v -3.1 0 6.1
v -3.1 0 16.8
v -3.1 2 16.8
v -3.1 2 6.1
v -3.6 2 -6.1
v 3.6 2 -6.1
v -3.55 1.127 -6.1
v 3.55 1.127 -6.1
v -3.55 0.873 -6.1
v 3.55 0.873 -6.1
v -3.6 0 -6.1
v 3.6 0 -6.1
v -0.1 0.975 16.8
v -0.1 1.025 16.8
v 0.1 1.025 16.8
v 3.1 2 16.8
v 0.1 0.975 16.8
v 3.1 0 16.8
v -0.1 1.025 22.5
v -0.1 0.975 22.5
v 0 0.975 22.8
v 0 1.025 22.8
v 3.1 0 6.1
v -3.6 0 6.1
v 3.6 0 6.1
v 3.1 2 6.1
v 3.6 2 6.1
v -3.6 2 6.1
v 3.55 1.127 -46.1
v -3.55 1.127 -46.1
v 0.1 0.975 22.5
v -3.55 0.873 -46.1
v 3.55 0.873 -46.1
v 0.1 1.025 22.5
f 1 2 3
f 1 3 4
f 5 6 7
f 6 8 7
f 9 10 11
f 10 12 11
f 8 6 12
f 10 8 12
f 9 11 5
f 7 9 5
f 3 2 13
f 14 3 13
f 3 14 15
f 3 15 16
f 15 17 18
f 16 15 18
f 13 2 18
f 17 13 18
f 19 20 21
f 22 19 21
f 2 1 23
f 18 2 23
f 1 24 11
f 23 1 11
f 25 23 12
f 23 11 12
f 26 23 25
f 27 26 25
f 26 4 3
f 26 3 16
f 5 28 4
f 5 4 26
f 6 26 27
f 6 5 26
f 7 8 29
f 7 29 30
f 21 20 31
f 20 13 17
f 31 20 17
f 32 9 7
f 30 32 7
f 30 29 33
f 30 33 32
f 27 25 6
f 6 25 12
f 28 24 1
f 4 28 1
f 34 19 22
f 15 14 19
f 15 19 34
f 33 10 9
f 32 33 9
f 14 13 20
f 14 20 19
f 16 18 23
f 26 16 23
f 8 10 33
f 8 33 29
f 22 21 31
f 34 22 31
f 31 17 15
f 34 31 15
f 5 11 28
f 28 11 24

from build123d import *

# Parameters (mm, degrees)
SKETCH1_W           = 6.2
SKETCH1_H           = 10.7
BOSS_EXTRUDE1_DEPTH = 2
SKETCH2_W           = 7.1
SKETCH2_H           = 0.25368462
BOSS_EXTRUDE2_DEPTH = 40
SKETCH3_W           = 0.2
SKETCH3_H           = 0.05
BOSS_EXTRUDE3_DEPTH = 6
CUT_EXTRUDE1_DEPTH  = 0.05


with BuildPart() as part:
    # Sketch1 → Boss-Extrude1 (new body)
    with BuildSketch(Plane(origin=(0, 0, 0), x_dir=(1, 0, 0), z_dir=(0, 1, 0))):
        Polygon((-3.6, -6.1), (-3.1, -6.1), (3.1, -6.1), (3.6, -6.1), (3.6, 6.1), (-3.6, 6.1), align=None)
        with Locations((0, -11.45)):
            Rectangle(SKETCH1_W, SKETCH1_H)
    extrude(amount=BOSS_EXTRUDE1_DEPTH)

    # Sketch2 → Boss-Extrude2 (add)
    with BuildSketch(Plane(origin=(0, 0, -6.1), x_dir=(-1, 0, 0), z_dir=(0, 0, -1))):
        with Locations((0, 1)):
            Rectangle(SKETCH2_W, SKETCH2_H)
    extrude(amount=BOSS_EXTRUDE2_DEPTH)

    # Sketch3 → Boss-Extrude3 (add)
    with BuildSketch(Plane.XY.offset(16.8)):
        with Locations((0, 1)):
            Rectangle(SKETCH3_W, SKETCH3_H)
    extrude(amount=BOSS_EXTRUDE3_DEPTH)

    # Sketch4 → Cut-Extrude1 (cut)
    with BuildSketch(Plane.XZ.offset(-0.975)):
        Polygon((0.1, 22.8), (0, 22.8), (0.1, 22.5), align=None)
        Polygon((-0.1, 22.8), (-0.1, 22.5), (0, 22.8), align=None)
    extrude(amount=-CUT_EXTRUDE1_DEPTH, mode=Mode.SUBTRACT)


solid = part.part
